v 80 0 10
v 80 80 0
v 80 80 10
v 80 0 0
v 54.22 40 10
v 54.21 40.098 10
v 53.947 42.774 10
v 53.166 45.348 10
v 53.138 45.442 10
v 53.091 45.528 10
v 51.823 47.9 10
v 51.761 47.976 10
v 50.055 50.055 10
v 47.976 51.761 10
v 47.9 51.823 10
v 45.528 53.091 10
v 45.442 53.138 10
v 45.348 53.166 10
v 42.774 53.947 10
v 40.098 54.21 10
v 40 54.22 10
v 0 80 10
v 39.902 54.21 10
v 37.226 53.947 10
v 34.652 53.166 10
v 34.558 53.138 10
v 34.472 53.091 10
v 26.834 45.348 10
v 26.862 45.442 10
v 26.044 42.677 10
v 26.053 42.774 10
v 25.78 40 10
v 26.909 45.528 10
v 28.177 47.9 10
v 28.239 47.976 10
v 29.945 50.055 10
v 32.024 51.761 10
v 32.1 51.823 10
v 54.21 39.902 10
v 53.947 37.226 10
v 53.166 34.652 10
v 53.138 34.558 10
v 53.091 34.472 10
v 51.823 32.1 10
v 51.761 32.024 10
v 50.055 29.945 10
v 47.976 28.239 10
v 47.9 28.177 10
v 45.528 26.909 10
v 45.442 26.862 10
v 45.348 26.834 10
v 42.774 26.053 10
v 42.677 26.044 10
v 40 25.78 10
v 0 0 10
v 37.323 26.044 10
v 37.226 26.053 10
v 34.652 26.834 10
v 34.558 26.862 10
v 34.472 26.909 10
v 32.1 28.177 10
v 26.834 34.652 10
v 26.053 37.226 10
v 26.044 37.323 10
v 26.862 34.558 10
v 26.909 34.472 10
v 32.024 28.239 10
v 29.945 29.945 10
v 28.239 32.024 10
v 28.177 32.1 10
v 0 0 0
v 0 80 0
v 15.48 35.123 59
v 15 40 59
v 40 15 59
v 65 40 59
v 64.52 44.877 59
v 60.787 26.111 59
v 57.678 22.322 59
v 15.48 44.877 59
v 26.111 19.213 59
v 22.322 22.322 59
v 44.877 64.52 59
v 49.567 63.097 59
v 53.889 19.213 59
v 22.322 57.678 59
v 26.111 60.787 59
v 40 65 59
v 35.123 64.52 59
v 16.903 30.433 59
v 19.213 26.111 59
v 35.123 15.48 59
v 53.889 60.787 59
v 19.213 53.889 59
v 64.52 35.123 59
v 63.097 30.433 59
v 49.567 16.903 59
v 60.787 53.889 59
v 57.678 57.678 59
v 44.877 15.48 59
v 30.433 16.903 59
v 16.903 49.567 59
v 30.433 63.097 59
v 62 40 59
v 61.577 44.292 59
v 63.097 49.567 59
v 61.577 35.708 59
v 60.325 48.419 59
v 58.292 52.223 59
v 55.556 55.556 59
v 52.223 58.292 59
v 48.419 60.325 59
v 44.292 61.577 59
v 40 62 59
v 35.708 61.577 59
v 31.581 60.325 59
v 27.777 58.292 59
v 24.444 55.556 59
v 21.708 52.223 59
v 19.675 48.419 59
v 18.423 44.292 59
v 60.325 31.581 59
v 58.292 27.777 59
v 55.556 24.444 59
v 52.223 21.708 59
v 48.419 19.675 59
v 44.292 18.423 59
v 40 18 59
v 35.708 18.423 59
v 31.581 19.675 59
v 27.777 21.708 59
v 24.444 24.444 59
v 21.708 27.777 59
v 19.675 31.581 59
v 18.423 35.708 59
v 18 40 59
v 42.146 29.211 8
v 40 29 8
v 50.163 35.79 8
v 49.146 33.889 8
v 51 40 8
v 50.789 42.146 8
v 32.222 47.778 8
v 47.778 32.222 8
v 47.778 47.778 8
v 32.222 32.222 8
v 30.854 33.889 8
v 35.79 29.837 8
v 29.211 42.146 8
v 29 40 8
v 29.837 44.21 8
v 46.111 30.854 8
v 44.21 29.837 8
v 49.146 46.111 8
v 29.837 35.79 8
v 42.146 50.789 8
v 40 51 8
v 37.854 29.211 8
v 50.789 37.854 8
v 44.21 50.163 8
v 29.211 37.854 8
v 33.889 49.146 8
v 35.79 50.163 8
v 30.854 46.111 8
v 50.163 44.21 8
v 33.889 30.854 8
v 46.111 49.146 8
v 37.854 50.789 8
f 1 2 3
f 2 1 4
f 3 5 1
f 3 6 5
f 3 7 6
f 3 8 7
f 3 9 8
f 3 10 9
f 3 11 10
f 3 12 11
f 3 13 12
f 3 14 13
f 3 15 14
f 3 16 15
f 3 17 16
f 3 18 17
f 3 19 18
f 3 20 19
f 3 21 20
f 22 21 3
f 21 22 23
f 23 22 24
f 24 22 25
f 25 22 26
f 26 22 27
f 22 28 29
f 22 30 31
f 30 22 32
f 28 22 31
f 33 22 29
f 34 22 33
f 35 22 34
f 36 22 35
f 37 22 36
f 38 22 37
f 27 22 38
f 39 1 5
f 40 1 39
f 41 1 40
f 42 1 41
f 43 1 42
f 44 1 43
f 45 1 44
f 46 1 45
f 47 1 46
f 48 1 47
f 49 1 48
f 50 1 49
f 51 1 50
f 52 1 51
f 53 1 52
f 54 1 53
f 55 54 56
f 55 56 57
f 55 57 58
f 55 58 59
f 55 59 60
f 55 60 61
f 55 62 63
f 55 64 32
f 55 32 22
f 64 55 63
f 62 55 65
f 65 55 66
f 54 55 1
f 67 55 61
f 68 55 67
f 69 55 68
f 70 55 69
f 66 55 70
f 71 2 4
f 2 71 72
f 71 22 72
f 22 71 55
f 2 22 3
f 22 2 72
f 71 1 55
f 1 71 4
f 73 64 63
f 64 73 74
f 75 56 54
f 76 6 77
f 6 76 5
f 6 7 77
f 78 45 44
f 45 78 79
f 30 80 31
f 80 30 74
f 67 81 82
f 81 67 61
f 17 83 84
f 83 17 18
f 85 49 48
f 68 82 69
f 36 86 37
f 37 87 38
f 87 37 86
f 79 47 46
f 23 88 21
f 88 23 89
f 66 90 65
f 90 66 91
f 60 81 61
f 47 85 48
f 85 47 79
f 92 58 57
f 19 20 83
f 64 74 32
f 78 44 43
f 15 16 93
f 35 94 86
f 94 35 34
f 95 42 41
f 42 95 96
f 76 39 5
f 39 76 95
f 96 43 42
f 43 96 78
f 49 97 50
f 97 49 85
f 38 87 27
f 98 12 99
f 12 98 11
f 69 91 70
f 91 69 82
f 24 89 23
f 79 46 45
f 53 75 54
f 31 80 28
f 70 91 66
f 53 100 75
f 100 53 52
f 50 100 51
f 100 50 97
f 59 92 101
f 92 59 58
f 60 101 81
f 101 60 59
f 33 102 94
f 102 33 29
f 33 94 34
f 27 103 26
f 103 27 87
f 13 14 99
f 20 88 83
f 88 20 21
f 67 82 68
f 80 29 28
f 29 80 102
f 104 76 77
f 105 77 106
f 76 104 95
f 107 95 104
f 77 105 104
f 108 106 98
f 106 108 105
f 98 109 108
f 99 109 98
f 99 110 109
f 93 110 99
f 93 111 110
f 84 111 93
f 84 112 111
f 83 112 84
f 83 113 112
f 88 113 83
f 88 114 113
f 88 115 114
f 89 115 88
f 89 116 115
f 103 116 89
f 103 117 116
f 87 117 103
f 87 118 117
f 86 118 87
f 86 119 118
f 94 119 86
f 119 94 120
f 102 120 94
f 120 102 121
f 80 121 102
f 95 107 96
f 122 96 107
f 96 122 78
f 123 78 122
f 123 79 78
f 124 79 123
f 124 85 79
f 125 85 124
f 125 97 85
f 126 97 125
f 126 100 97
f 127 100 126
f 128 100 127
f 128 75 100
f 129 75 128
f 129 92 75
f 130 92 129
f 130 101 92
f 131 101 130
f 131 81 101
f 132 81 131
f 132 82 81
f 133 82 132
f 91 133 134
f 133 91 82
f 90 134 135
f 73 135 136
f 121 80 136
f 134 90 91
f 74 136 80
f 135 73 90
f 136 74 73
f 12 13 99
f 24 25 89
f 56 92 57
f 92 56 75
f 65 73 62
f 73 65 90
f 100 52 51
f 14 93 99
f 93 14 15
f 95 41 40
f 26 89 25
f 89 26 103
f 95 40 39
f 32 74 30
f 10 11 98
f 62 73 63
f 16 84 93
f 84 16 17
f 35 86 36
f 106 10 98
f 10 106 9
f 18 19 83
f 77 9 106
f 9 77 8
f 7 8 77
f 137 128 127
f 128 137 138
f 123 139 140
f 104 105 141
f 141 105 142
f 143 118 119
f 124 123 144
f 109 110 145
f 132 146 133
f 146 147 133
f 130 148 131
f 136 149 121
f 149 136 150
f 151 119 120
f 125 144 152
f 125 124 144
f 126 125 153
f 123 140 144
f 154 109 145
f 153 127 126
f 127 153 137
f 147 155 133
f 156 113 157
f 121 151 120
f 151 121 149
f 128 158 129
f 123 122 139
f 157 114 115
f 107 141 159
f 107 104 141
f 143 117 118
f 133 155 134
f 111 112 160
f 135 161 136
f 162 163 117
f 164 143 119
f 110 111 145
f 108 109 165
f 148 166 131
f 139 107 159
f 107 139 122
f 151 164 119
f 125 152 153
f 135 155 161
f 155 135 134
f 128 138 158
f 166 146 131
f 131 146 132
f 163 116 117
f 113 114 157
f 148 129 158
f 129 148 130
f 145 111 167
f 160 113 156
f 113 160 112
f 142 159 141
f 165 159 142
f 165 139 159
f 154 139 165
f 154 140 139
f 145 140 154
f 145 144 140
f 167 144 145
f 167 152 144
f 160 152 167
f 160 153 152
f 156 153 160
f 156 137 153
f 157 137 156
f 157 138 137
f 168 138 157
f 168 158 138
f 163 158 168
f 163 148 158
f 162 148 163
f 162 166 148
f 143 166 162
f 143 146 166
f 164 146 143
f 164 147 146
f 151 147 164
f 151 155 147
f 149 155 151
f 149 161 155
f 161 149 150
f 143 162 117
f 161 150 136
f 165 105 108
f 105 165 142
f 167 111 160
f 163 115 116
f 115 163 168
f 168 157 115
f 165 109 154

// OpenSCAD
$fn = 32;

// ----------------------------------------------------------------------
// Hopper: funnel with square flange
// ----------------------------------------------------------------------

// --- parameters (mm) ---
fl = 80;                  // flange side, X and Y
fl_t = 10;                // flange thickness
cone_h = 50;              // cone height above the flange
top_d = 50;               // cone mouth diameter
bot_d = 28;               // cone spout diameter
wall = 3;                 // cone wall thickness
fit_tol = 0.05;           // tolerance for press fits, mm
free_tol = 0.3;           // tolerance for clearance fits, mm

bore_d = bot_d - 2 * wall;  // spout bore diameter
total_h = fl_t + cone_h - 1;  // overall height

difference() {
  union() {
    cube([fl, fl, fl_t]);
    translate([fl / 2, fl / 2, fl_t - 1])
      cylinder(h = cone_h, d1 = bot_d, d2 = top_d);
  }
  translate([fl / 2, fl / 2, fl_t - 2])
    cylinder(h = cone_h + 1, d1 = bore_d, d2 = top_d - 2 * wall);
}
